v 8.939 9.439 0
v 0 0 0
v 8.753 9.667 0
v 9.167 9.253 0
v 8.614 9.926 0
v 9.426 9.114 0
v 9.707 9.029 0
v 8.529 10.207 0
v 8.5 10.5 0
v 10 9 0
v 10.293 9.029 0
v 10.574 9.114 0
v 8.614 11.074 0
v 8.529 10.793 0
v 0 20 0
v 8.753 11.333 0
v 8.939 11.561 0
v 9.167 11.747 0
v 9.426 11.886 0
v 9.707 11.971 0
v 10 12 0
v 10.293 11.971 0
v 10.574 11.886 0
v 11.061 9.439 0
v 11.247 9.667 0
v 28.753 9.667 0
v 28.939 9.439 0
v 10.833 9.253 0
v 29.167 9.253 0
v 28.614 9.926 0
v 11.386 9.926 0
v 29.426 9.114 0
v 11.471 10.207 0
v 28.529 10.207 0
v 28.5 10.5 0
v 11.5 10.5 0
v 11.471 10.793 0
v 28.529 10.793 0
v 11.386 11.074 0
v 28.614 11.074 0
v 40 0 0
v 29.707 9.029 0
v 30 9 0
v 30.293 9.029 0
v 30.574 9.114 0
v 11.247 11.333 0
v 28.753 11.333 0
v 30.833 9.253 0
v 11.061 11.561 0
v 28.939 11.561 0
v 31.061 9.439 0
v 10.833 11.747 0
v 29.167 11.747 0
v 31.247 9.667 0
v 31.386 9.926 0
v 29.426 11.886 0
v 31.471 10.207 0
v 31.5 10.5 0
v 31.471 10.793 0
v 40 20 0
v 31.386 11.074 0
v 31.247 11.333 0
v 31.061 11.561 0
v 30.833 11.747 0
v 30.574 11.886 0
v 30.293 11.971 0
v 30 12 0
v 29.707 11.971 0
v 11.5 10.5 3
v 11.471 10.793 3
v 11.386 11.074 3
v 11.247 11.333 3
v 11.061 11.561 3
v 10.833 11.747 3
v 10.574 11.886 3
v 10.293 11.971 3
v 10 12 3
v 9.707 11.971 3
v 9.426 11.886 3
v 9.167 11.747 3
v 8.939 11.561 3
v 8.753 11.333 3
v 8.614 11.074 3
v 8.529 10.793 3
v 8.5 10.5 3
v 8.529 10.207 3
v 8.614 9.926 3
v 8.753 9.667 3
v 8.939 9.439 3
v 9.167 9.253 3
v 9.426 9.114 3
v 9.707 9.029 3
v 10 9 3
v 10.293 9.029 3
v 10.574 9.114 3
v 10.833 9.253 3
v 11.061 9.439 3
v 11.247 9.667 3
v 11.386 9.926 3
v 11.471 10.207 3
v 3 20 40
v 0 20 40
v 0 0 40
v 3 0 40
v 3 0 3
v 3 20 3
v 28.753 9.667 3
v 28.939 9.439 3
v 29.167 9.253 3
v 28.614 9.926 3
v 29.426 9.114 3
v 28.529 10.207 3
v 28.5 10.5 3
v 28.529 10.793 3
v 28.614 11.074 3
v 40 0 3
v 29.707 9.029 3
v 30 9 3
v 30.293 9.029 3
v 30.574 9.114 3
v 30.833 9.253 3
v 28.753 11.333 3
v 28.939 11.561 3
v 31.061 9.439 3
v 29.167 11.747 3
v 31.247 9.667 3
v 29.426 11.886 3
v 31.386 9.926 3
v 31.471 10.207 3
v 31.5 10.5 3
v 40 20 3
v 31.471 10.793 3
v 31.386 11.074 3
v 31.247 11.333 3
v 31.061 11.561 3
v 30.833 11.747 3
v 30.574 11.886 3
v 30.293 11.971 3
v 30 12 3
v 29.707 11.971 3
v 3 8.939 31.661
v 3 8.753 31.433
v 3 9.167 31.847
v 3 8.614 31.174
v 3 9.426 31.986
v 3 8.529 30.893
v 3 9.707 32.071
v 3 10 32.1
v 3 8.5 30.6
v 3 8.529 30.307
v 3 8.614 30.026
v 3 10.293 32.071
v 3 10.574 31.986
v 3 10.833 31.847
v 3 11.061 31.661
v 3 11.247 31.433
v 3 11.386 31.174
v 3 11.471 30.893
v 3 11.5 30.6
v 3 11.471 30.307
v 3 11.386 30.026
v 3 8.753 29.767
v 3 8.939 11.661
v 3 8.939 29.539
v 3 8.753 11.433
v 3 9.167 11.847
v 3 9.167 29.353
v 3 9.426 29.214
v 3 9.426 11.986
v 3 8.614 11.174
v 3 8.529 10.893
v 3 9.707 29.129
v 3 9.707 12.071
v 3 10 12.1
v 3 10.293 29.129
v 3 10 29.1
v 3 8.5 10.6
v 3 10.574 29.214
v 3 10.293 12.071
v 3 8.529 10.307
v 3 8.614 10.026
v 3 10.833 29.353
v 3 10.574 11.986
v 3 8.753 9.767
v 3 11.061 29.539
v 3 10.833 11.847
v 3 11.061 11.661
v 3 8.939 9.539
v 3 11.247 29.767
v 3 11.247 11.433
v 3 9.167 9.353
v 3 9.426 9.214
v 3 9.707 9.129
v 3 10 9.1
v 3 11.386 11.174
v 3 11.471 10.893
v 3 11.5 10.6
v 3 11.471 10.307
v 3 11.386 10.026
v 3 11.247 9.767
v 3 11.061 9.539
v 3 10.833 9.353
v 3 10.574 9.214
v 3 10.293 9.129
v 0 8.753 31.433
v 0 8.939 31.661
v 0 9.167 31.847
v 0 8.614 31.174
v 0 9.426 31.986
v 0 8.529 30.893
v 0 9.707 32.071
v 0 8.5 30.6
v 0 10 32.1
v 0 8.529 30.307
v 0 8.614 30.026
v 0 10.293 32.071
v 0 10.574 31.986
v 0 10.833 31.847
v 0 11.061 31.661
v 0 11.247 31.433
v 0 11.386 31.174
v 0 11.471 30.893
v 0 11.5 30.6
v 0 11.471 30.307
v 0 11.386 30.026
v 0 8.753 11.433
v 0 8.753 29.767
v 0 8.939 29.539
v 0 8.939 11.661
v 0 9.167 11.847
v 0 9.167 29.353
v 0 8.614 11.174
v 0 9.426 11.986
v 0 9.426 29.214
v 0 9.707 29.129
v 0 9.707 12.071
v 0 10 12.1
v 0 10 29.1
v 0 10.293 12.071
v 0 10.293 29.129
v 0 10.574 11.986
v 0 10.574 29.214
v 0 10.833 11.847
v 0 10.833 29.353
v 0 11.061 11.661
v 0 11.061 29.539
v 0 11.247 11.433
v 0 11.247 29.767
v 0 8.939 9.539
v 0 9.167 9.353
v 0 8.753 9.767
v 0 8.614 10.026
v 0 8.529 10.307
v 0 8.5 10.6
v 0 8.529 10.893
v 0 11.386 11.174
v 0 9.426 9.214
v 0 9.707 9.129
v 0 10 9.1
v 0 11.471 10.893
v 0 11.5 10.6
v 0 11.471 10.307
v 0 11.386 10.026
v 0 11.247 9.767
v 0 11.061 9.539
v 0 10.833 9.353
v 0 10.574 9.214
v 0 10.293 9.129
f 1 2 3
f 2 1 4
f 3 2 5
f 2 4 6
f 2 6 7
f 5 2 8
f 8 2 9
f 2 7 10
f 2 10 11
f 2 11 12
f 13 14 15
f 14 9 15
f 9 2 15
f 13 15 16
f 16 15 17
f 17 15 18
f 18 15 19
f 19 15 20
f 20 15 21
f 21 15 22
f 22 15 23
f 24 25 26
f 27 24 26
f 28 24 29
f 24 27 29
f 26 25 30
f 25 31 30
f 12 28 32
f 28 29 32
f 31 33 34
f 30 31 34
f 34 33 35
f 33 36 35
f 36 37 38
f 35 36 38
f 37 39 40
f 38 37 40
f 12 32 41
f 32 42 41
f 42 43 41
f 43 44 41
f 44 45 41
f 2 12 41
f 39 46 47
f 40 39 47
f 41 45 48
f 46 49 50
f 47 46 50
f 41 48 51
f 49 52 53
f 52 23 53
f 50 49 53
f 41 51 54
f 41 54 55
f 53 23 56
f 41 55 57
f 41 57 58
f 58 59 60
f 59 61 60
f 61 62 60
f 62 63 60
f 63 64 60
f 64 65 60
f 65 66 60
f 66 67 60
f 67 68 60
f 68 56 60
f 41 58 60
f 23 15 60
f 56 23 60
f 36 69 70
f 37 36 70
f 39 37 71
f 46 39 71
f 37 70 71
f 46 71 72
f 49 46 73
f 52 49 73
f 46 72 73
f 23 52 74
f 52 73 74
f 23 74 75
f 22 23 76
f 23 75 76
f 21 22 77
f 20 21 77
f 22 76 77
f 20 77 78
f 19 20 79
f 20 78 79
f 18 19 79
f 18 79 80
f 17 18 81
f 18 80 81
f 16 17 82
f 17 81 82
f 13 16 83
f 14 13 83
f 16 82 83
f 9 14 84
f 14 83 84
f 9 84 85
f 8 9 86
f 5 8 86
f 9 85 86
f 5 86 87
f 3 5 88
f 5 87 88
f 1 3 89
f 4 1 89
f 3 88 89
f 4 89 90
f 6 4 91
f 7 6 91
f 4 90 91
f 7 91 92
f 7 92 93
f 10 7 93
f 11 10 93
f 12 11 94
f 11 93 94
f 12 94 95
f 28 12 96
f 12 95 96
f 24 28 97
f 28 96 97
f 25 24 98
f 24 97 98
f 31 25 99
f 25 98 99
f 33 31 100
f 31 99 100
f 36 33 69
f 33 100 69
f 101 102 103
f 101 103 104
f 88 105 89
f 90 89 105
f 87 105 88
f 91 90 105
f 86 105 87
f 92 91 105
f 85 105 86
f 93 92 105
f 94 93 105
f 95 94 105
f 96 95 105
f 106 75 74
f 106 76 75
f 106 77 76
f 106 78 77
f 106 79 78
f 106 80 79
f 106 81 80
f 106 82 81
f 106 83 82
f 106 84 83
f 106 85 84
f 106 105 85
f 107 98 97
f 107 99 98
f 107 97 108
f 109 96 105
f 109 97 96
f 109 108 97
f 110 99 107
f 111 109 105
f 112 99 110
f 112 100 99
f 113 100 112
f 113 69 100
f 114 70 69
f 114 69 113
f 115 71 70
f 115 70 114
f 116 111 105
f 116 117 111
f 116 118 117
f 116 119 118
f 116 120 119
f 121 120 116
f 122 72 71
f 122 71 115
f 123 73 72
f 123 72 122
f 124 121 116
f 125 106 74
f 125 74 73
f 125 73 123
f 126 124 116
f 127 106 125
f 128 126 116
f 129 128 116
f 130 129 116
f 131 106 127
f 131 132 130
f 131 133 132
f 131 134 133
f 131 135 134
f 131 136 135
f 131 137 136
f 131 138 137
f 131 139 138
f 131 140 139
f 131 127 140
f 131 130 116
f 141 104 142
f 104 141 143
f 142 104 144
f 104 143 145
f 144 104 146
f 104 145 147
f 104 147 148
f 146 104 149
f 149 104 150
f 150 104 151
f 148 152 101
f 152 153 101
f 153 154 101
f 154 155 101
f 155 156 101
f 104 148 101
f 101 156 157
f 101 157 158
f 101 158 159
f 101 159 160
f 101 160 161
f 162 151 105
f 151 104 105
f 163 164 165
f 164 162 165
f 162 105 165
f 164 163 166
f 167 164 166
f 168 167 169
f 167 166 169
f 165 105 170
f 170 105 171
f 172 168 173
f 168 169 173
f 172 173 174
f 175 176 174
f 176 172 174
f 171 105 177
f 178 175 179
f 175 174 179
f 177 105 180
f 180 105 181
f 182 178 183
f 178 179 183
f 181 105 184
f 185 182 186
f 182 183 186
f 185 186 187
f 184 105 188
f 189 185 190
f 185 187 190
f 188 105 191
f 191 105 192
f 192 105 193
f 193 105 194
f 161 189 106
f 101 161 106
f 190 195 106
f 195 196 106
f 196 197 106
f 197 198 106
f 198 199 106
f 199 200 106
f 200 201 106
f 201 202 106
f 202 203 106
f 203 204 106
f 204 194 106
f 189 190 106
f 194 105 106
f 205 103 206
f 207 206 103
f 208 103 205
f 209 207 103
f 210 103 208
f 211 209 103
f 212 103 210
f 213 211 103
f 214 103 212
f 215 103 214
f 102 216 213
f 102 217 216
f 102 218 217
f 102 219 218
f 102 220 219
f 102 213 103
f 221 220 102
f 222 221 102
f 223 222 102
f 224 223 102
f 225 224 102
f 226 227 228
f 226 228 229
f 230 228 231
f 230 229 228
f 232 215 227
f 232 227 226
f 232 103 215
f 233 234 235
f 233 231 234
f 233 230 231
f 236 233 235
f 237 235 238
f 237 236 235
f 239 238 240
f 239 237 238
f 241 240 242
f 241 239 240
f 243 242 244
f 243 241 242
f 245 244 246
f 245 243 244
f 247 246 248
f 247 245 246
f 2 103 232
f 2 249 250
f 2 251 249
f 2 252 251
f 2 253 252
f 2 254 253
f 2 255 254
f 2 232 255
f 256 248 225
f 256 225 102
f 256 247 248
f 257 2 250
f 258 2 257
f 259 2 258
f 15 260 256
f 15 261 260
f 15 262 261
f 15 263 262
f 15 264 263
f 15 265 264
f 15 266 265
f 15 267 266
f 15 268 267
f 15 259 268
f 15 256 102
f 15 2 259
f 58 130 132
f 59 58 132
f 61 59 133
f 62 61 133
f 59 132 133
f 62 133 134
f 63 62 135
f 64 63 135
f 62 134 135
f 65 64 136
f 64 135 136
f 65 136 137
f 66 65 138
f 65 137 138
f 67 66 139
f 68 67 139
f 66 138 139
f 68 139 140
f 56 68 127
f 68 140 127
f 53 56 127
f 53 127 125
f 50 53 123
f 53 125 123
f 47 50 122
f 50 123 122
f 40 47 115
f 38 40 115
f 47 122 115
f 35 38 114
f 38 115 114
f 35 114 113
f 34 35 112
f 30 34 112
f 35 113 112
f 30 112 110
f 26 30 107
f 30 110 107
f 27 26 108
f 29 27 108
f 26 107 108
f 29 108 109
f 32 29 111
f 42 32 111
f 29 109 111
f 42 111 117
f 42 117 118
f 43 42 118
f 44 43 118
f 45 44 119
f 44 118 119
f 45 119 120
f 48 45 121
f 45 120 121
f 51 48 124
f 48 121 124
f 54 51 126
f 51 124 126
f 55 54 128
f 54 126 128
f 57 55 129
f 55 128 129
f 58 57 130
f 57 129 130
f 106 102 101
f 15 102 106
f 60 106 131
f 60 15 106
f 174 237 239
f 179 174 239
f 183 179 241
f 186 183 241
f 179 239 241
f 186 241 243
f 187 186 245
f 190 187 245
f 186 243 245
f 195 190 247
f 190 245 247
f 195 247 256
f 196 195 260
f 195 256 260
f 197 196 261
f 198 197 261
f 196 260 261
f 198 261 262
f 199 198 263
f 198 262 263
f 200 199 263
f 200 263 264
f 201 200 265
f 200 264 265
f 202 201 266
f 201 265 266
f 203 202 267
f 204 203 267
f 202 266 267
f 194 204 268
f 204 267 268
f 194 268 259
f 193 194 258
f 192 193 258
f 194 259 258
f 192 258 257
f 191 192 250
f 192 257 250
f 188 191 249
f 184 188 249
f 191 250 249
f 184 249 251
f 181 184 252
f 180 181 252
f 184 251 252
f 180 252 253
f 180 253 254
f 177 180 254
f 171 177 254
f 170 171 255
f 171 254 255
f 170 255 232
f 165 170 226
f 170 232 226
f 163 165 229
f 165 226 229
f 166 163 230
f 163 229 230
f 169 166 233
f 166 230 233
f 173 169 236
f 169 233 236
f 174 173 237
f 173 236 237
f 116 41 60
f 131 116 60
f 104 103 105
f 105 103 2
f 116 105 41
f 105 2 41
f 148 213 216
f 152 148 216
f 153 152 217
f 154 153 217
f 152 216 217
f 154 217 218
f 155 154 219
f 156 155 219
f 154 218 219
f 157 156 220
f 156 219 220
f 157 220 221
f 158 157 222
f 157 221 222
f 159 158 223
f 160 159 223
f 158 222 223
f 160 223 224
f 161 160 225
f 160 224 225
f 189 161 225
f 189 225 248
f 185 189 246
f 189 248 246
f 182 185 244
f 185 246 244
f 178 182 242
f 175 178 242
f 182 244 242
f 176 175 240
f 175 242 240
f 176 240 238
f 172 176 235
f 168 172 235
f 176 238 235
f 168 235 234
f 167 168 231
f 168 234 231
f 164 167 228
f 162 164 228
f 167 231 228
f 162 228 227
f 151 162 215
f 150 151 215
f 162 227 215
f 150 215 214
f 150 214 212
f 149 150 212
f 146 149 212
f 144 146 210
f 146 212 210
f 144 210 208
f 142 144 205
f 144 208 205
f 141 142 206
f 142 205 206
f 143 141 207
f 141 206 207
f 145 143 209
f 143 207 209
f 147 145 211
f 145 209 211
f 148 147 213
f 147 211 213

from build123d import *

# Parameters (mm, degrees)
ESQUISSE1_W             = 40
ESQUISSE1_H             = 20
BOSS_EXTRU_1_DEPTH      = 3
ESQUISSE2_R             = 1.5
ENL_V_MAT_EXTRU_1_DEPTH = 3
ESQUISSE3_W             = 3
ESQUISSE3_H             = 20
BOSS_EXTRU_2_DEPTH      = 37
ESQUISSE4_R             = 1.5
ENL_V_MAT_EXTRU_2_DEPTH = 3


with BuildPart() as part:
    # Esquisse1 → Boss.-Extru.1 (new body)
    with BuildSketch(Plane.XY):
        with Locations((20, 10)):
            Rectangle(ESQUISSE1_W, ESQUISSE1_H)
    extrude(amount=BOSS_EXTRU_1_DEPTH)

    # Esquisse2 → Enlèv. mat.-Extru.1 (cut)
    with BuildSketch(Plane.XY.offset(3)):
        with Locations((10, 10.5)):
            Circle(ESQUISSE2_R)
        with Locations((30, 10.5)):
            Circle(ESQUISSE2_R)
    extrude(amount=-ENL_V_MAT_EXTRU_1_DEPTH, mode=Mode.SUBTRACT)

    # Esquisse3 → Boss.-Extru.2 (add)
    with BuildSketch(Plane.XY.offset(3)):
        with Locations((1.5, 10)):
            Rectangle(ESQUISSE3_W, ESQUISSE3_H)
    extrude(amount=BOSS_EXTRU_2_DEPTH)

    # Esquisse4 → Enlèv. mat.-Extru.2 (cut)
    with BuildSketch(Plane.ZY):
        with Locations((10.6, 10)):
            Circle(ESQUISSE4_R)
        with Locations((30.6, 10)):
            Circle(ESQUISSE4_R)
    extrude(amount=-ENL_V_MAT_EXTRU_2_DEPTH, mode=Mode.SUBTRACT)


solid = part.part
